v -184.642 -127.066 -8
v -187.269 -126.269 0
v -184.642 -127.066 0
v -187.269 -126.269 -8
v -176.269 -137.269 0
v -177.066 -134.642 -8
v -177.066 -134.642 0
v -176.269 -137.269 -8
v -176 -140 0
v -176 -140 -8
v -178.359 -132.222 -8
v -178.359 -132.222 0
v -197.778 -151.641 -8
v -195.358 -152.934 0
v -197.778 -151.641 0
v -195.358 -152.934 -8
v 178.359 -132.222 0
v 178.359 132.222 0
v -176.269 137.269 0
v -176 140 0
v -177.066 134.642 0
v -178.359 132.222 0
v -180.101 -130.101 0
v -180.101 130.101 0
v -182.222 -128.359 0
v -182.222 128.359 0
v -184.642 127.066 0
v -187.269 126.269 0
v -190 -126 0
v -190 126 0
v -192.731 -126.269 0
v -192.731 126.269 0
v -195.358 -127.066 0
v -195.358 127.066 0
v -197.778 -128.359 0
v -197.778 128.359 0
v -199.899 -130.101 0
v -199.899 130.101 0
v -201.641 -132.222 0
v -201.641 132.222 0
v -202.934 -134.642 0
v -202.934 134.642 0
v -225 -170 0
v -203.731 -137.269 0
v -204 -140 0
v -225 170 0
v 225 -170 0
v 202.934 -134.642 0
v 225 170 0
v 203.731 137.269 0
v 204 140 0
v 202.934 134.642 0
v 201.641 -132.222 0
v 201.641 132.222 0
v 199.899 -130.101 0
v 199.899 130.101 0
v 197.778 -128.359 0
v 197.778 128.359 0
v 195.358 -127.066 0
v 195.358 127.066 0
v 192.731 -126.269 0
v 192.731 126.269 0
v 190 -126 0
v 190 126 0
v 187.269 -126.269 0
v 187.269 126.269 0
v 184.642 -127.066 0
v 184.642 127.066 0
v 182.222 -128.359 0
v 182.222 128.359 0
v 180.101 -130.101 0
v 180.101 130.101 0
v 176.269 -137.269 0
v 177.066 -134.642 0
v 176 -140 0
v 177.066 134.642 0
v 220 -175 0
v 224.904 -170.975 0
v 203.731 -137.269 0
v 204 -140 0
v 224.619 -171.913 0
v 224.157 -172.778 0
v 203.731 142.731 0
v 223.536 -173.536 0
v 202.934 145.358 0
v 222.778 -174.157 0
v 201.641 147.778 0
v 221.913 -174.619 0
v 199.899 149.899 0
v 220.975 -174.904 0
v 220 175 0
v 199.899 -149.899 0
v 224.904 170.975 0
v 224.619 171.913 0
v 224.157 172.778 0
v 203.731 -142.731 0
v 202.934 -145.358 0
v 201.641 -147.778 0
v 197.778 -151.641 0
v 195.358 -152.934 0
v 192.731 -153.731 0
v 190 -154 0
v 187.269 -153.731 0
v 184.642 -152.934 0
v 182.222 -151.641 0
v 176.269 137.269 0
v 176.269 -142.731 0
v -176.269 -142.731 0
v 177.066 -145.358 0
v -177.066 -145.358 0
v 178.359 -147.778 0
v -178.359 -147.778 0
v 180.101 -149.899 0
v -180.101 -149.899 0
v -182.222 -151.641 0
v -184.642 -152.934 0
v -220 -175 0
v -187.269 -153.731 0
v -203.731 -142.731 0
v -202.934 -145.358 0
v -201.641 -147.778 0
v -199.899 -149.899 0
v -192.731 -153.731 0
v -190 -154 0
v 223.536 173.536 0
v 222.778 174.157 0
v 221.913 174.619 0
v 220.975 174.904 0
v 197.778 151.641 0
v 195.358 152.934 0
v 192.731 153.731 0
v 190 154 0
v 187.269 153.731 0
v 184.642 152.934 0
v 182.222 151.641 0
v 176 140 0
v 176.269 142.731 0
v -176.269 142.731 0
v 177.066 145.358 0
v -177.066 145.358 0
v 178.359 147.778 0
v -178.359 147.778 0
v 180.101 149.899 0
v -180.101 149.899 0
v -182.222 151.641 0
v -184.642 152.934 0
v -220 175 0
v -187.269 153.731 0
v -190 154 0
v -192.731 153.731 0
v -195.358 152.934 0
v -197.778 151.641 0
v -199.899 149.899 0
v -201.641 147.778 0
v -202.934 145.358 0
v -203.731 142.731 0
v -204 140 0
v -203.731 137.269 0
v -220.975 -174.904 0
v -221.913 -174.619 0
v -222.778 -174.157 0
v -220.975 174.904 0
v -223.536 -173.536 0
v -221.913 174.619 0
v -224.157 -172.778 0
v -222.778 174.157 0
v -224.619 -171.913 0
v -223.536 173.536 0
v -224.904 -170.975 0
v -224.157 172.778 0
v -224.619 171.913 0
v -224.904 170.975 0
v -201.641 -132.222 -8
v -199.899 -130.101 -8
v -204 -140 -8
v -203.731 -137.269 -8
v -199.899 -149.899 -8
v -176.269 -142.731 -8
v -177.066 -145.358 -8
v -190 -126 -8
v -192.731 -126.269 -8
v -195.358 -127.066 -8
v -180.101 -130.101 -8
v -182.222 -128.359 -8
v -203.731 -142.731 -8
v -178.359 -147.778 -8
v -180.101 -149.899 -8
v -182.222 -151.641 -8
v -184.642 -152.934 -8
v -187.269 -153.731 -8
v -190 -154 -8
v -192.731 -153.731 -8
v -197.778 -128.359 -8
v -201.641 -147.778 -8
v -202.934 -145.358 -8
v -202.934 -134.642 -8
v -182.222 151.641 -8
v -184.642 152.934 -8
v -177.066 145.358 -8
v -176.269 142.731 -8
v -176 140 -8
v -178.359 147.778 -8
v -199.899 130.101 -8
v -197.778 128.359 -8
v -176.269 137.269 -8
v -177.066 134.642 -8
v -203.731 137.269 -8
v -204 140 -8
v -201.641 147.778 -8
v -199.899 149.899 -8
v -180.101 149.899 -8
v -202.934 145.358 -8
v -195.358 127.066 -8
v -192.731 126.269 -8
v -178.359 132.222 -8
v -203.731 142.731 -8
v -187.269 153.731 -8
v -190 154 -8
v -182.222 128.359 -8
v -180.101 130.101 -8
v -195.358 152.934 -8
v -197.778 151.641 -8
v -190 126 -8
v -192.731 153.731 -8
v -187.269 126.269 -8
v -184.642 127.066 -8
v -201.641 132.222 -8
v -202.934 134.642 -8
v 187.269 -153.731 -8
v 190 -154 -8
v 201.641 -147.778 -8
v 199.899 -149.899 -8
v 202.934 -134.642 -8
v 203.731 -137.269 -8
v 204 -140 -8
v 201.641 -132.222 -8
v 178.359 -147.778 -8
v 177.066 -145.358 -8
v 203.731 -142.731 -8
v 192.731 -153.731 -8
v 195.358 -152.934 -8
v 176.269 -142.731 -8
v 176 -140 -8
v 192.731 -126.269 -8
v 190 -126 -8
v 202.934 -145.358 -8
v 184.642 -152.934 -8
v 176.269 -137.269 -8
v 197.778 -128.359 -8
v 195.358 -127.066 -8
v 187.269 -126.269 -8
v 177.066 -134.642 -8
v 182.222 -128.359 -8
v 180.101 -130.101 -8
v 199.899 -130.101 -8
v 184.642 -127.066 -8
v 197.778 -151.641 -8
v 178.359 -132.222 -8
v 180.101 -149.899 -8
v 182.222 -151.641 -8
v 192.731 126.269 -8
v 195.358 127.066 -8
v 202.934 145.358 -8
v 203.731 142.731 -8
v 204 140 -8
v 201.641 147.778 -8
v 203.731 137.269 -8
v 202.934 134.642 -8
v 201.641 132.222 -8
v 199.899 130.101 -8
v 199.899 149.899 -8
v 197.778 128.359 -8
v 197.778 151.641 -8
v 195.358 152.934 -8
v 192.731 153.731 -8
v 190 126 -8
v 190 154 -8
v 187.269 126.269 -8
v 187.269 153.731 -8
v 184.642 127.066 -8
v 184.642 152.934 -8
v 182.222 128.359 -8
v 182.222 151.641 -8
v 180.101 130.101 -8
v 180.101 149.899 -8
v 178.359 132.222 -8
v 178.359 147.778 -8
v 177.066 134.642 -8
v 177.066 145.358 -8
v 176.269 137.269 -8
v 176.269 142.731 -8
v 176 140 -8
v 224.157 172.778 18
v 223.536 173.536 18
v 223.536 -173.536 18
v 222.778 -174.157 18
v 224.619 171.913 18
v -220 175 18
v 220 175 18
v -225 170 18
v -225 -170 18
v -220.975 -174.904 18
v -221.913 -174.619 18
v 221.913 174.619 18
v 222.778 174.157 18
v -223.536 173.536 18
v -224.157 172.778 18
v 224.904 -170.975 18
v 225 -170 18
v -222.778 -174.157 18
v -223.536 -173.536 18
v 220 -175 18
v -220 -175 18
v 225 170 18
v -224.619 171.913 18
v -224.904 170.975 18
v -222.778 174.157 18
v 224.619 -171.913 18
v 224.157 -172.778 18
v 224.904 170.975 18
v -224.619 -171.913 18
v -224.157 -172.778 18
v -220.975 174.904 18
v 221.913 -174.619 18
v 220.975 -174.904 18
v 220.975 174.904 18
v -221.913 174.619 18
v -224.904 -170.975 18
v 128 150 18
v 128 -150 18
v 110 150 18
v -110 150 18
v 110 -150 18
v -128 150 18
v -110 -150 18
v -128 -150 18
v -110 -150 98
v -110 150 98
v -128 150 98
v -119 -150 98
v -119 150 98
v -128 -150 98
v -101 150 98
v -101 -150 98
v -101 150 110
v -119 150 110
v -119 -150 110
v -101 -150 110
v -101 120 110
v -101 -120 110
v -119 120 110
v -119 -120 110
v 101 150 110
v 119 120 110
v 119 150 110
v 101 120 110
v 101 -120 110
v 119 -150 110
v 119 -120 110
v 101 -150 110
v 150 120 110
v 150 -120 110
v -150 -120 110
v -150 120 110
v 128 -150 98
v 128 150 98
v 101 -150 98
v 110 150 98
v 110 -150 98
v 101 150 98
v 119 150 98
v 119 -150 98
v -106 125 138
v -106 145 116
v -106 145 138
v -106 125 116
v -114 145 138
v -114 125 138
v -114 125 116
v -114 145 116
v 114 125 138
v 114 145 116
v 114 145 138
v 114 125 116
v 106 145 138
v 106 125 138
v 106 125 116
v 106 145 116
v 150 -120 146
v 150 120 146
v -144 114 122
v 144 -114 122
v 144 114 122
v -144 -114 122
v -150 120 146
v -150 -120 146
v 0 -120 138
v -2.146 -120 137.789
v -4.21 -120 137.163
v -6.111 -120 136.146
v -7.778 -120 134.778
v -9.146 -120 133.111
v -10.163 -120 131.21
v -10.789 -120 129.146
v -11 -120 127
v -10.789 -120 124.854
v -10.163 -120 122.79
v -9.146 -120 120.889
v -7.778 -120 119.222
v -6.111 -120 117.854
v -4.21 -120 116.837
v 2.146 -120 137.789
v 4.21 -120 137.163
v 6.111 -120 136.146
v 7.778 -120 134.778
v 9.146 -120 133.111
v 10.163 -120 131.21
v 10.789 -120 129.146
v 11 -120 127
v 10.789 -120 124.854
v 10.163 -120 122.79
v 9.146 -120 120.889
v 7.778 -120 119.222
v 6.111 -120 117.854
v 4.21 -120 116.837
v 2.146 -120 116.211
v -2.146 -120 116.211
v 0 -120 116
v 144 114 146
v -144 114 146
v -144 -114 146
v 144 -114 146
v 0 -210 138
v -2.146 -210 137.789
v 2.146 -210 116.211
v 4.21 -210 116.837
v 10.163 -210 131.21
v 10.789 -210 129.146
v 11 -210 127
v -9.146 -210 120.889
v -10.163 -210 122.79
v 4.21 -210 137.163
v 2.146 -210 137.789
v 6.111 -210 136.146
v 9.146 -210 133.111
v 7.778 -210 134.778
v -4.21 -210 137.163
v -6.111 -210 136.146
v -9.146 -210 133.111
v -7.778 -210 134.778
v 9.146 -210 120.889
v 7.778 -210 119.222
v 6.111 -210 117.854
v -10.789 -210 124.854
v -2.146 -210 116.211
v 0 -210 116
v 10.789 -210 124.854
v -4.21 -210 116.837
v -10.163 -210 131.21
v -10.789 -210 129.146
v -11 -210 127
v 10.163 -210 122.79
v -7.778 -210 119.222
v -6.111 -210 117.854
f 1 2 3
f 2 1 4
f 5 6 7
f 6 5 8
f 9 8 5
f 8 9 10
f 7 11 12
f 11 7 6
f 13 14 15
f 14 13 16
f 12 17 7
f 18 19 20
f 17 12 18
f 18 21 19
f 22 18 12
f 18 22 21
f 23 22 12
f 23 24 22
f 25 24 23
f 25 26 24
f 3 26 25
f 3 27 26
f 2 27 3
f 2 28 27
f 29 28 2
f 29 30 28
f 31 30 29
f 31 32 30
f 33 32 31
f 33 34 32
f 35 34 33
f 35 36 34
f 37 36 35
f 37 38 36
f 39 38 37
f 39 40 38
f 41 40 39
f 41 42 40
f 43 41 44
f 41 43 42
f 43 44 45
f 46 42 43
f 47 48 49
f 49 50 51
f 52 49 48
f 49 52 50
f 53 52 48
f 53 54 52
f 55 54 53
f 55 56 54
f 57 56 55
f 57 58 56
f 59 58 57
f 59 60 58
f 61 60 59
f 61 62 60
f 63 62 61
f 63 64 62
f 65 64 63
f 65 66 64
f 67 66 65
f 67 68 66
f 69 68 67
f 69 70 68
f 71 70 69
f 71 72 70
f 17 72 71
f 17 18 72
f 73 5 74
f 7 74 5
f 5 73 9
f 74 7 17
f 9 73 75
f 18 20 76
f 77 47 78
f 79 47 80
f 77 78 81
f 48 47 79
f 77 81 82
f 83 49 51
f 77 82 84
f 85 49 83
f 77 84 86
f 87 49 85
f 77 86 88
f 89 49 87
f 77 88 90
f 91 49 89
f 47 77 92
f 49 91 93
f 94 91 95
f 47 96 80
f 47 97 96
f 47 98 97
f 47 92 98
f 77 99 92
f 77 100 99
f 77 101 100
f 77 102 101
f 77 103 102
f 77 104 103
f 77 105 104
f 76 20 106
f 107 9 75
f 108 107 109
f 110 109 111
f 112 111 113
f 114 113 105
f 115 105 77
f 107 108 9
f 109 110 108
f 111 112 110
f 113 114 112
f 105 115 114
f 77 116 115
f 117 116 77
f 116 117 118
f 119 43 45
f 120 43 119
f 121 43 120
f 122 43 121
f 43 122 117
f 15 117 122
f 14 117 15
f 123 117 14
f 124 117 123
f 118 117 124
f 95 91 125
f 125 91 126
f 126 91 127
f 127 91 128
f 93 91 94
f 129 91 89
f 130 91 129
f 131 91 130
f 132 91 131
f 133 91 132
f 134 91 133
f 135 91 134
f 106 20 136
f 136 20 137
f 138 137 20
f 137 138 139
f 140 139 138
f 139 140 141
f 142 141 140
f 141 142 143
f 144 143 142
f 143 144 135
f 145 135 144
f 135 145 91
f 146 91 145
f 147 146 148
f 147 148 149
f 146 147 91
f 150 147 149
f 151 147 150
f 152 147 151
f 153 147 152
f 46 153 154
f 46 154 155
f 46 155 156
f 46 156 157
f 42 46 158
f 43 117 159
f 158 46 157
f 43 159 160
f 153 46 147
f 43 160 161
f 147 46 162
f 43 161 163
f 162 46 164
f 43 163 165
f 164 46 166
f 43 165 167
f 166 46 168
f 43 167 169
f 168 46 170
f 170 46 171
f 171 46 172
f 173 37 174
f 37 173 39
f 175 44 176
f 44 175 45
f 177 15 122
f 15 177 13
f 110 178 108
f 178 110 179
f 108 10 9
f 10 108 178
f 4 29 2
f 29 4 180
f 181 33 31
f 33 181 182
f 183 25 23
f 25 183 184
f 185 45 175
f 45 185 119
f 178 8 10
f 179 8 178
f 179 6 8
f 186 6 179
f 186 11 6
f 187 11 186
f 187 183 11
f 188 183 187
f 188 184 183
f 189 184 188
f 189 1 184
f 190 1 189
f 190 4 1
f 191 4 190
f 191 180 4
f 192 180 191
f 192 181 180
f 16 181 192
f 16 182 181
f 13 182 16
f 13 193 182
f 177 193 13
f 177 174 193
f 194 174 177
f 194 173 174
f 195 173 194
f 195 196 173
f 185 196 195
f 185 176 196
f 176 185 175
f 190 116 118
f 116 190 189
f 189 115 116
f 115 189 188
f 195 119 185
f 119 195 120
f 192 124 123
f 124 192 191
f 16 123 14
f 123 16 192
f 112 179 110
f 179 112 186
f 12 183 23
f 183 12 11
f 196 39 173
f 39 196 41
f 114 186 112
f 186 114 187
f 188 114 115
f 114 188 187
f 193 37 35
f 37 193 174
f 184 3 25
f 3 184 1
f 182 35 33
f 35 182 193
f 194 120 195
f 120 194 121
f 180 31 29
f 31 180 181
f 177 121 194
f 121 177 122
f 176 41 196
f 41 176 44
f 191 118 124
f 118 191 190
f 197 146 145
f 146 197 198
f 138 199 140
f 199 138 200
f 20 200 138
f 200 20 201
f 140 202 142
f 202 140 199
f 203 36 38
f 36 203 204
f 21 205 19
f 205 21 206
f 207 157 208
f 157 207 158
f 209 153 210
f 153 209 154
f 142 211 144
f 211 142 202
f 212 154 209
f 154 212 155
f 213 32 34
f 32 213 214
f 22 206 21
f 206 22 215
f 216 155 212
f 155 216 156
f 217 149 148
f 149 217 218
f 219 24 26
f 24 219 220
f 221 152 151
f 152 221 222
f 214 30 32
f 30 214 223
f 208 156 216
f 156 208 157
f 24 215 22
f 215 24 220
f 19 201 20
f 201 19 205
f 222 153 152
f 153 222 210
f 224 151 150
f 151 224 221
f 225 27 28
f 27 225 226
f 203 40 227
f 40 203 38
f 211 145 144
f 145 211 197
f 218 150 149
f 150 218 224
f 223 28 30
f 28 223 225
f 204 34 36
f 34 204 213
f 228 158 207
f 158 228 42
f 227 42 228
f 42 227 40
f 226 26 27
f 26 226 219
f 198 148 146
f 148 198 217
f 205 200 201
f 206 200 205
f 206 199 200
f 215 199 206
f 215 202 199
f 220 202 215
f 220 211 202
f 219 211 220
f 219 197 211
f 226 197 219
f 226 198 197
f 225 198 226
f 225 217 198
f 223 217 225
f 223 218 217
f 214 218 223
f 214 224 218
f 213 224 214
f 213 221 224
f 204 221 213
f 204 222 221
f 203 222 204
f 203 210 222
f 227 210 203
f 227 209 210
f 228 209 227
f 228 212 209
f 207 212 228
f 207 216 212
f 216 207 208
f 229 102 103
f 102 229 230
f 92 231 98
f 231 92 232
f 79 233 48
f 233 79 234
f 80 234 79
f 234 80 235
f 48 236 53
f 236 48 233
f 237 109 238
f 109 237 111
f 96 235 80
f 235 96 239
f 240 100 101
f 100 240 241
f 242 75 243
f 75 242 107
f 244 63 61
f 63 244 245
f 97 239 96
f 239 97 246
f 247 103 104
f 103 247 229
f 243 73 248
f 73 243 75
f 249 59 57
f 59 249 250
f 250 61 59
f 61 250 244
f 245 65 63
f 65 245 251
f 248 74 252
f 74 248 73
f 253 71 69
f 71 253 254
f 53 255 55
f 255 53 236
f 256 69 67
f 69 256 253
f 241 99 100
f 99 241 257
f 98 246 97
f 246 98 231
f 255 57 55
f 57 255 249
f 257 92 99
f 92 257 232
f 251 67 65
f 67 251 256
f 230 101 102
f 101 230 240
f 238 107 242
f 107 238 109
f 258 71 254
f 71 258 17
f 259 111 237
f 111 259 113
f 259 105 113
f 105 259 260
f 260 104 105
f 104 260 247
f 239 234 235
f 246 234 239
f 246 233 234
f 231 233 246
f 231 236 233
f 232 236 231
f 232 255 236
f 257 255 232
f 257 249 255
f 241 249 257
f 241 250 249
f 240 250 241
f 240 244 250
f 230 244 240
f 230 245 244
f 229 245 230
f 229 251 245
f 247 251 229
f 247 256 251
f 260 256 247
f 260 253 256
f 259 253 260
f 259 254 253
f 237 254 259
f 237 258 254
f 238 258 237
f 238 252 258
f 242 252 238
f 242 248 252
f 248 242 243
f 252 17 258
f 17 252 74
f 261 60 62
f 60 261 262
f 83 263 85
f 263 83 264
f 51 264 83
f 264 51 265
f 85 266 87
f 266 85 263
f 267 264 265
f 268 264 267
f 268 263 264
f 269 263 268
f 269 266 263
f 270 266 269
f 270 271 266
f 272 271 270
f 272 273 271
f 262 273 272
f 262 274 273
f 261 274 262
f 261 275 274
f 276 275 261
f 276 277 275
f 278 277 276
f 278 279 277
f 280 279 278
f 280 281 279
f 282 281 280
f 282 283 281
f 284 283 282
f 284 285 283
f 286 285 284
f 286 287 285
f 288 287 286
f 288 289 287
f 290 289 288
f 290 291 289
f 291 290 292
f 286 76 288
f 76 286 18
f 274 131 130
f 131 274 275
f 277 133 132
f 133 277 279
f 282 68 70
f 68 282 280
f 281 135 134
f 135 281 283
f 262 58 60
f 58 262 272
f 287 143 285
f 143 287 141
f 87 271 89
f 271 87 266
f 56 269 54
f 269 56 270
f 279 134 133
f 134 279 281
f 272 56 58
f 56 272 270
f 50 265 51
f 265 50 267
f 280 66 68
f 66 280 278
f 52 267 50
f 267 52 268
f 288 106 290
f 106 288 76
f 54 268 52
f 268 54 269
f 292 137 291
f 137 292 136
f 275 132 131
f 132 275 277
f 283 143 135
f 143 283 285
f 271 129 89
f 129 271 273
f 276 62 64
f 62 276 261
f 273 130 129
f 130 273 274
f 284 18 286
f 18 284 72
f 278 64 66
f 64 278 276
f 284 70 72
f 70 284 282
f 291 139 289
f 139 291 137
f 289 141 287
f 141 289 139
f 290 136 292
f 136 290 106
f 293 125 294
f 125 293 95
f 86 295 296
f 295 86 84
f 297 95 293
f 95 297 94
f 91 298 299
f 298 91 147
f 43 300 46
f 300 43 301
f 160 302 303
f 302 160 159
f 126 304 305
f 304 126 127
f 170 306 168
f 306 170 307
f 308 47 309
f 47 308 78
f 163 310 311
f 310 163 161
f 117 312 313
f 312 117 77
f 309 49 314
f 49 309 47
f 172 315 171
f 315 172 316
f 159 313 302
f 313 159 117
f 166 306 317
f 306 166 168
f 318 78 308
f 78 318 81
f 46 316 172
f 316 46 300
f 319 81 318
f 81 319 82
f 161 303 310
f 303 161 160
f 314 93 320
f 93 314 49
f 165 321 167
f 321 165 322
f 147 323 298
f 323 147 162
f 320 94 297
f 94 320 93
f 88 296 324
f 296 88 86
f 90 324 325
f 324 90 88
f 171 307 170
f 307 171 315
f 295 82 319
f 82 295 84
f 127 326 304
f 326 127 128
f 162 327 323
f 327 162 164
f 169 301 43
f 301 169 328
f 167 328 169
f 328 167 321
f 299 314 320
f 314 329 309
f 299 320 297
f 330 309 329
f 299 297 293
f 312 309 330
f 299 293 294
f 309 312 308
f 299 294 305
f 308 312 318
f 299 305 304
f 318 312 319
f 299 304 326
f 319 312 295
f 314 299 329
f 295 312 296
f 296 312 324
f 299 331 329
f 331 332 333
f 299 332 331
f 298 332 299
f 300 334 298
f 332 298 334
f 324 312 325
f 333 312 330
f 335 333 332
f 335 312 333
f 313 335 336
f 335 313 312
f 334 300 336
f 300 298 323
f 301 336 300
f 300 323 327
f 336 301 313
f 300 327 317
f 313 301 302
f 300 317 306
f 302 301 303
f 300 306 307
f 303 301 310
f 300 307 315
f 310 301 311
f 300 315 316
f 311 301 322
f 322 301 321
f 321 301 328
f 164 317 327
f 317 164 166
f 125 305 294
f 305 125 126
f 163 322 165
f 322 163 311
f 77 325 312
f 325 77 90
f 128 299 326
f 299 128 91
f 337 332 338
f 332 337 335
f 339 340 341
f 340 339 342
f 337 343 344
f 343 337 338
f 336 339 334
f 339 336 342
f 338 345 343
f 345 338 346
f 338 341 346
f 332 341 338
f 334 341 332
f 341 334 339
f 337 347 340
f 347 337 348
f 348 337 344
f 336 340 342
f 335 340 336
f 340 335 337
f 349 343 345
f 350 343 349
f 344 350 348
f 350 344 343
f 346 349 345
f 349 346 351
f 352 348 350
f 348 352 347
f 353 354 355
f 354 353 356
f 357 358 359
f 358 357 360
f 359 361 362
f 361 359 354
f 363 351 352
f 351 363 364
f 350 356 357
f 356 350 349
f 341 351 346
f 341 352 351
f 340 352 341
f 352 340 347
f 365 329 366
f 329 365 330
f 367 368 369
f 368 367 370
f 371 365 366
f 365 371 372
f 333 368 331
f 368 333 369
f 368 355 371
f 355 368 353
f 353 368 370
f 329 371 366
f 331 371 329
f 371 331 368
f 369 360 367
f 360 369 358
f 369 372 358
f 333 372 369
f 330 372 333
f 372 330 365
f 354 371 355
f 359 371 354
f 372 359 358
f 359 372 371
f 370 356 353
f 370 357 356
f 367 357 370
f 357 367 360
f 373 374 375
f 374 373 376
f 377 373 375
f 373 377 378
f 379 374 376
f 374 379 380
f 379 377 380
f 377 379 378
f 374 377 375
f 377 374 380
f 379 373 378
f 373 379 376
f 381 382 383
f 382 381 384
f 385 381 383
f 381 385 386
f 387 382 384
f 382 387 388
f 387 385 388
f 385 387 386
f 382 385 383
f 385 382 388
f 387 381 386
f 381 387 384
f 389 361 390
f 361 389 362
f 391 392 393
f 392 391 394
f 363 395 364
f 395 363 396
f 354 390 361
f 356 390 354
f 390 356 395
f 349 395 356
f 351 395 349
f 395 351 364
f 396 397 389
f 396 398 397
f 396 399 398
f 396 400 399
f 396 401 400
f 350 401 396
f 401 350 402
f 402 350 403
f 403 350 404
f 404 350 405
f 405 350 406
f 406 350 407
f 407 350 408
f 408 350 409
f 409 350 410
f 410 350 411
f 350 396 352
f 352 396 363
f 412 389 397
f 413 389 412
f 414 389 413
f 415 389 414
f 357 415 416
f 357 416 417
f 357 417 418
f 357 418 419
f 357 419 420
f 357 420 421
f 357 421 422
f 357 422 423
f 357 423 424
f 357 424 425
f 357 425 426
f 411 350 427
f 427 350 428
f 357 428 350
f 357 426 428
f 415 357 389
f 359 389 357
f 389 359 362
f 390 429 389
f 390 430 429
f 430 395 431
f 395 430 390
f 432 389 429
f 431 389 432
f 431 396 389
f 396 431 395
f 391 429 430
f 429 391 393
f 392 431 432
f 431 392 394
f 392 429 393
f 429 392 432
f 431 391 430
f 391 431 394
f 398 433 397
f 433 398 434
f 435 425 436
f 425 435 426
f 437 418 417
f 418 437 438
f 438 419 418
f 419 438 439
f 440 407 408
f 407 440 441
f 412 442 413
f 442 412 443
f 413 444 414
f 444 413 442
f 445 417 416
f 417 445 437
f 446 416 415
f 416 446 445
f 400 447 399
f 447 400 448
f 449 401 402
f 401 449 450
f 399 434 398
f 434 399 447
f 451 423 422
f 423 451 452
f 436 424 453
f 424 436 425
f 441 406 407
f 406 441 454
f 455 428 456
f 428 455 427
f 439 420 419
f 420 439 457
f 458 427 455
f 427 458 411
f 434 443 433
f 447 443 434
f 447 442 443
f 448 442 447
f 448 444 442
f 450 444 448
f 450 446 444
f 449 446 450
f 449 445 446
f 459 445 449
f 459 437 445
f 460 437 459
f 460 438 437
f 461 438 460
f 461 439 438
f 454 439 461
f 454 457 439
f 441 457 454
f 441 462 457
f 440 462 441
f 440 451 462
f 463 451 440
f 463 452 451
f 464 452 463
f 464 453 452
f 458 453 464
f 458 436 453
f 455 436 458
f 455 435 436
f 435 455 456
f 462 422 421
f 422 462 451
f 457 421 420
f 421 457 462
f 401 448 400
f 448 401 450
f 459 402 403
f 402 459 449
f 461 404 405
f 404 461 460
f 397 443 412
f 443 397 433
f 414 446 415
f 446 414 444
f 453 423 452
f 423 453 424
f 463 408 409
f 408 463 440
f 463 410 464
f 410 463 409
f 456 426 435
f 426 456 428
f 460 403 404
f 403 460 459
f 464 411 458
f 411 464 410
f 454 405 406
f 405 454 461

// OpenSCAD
// OMT3 Division II independent manual unloader — CONCEPT ONLY
// Units: mm. This model is a layout aid, not a certified structural drawing.
// The unloader must remain physically separate from the vehicle and shopping cart.
// Confirm all dimensions after measuring the actual cart, props and competition layout.

$fn = 32;

// Editable prototype envelope. Do not treat these as frozen manufacturing dimensions.
base_x = 450;
base_y = 350;
base_t = 18;

tray_x = 300;
tray_y = 240;
tray_t = 12;
tray_lip_h = 30;
tray_lip_t = 6;

rail_length = 300;
rail_spacing = 220;
rail_w = 18;
rail_h = 12;

support_h = 80;       // placeholder; adjust to measured cart rim / operator geometry
support_w = 18;
support_t = 18;

stop_h = 22;
stop_t = 8;
handle_d = 22;
handle_len = 90;

foot_d = 28;
foot_h = 8;

module rounded_box(x,y,z,r=4) {
    minkowski() {
        cube([x-2*r,y-2*r,z/2], center=true);
        cylinder(r=r,h=z/2,center=true);
    }
}

module base_plate() {
    translate([0,0,base_t/2])
        color("burlywood") rounded_box(base_x,base_y,base_t,5);
    for (sx=[-1,1], sy=[-1,1]) {
        translate([sx*(base_x/2-35),sy*(base_y/2-35),-foot_h/2])
            color("dimgray") cylinder(d=foot_d,h=foot_h,center=true);
    }
}

module supports_and_rails() {
    for (sx=[-1,1]) {
        translate([sx*(rail_spacing/2+support_w/2),0,base_t+support_h/2])
            color("silver") cube([support_w,base_y-50,support_h],center=true);
        translate([sx*rail_spacing/2,0,base_t+support_h+rail_h/2])
            color("gray") cube([rail_w,rail_length,rail_h],center=true);
    }
}

module tray_assembly() {
    tray_z = base_t + support_h + rail_h + tray_t/2;
    translate([0,0,tray_z]) {
        color("lightgray") cube([tray_x,tray_y,tray_t],center=true);
        // Low containment lips
        translate([0,tray_y/2-tray_lip_t/2,tray_lip_h/2])
            color("silver") cube([tray_x,tray_lip_t,tray_lip_h],center=true);
        translate([0,-tray_y/2+tray_lip_t/2,tray_lip_h/2])
            color("silver") cube([tray_x,tray_lip_t,tray_lip_h],center=true);
        translate([tray_x/2-tray_lip_t/2,0,tray_lip_h/2])
            color("silver") cube([tray_lip_t,tray_y,tray_lip_h],center=true);
        translate([-tray_x/2+tray_lip_t/2,0,tray_lip_h/2])
            color("silver") cube([tray_lip_t,tray_y,tray_lip_h],center=true);
        // Travel end stops (visual placeholders; actual anti-pullout hardware required)
        for (sx=[-1,1]) {
            translate([sx*(rail_spacing/2),tray_y/2+15,stop_h/2])
                color("orange") cube([stop_t,20,stop_h],center=true);
        }
        // Handle at operator side
        translate([0,-tray_y/2-handle_len/2,handle_d/2])
            rotate([90,0,0]) color("black") cylinder(d=handle_d,h=handle_len,center=true);
    }
}

base_plate();
supports_and_rails();
tray_assembly();

// REQUIRED DESIGN REVIEW BEFORE FABRICATION:
// 1) Replace support_h, tray position, rail length and base dimensions after physical measurement.
// 2) Specify actual commercial rail profile, fasteners and anti-pullout stops.
// 3) Check stability under maximum actual prop load and pull force.
// 4) Remove pinch points and add guards around moving rails.
// 5) Verify the device is freestanding and never attached to the vehicle/cart.
// 6) This model omits fastener holes, material grades, load calculations and manufacturing tolerances.
